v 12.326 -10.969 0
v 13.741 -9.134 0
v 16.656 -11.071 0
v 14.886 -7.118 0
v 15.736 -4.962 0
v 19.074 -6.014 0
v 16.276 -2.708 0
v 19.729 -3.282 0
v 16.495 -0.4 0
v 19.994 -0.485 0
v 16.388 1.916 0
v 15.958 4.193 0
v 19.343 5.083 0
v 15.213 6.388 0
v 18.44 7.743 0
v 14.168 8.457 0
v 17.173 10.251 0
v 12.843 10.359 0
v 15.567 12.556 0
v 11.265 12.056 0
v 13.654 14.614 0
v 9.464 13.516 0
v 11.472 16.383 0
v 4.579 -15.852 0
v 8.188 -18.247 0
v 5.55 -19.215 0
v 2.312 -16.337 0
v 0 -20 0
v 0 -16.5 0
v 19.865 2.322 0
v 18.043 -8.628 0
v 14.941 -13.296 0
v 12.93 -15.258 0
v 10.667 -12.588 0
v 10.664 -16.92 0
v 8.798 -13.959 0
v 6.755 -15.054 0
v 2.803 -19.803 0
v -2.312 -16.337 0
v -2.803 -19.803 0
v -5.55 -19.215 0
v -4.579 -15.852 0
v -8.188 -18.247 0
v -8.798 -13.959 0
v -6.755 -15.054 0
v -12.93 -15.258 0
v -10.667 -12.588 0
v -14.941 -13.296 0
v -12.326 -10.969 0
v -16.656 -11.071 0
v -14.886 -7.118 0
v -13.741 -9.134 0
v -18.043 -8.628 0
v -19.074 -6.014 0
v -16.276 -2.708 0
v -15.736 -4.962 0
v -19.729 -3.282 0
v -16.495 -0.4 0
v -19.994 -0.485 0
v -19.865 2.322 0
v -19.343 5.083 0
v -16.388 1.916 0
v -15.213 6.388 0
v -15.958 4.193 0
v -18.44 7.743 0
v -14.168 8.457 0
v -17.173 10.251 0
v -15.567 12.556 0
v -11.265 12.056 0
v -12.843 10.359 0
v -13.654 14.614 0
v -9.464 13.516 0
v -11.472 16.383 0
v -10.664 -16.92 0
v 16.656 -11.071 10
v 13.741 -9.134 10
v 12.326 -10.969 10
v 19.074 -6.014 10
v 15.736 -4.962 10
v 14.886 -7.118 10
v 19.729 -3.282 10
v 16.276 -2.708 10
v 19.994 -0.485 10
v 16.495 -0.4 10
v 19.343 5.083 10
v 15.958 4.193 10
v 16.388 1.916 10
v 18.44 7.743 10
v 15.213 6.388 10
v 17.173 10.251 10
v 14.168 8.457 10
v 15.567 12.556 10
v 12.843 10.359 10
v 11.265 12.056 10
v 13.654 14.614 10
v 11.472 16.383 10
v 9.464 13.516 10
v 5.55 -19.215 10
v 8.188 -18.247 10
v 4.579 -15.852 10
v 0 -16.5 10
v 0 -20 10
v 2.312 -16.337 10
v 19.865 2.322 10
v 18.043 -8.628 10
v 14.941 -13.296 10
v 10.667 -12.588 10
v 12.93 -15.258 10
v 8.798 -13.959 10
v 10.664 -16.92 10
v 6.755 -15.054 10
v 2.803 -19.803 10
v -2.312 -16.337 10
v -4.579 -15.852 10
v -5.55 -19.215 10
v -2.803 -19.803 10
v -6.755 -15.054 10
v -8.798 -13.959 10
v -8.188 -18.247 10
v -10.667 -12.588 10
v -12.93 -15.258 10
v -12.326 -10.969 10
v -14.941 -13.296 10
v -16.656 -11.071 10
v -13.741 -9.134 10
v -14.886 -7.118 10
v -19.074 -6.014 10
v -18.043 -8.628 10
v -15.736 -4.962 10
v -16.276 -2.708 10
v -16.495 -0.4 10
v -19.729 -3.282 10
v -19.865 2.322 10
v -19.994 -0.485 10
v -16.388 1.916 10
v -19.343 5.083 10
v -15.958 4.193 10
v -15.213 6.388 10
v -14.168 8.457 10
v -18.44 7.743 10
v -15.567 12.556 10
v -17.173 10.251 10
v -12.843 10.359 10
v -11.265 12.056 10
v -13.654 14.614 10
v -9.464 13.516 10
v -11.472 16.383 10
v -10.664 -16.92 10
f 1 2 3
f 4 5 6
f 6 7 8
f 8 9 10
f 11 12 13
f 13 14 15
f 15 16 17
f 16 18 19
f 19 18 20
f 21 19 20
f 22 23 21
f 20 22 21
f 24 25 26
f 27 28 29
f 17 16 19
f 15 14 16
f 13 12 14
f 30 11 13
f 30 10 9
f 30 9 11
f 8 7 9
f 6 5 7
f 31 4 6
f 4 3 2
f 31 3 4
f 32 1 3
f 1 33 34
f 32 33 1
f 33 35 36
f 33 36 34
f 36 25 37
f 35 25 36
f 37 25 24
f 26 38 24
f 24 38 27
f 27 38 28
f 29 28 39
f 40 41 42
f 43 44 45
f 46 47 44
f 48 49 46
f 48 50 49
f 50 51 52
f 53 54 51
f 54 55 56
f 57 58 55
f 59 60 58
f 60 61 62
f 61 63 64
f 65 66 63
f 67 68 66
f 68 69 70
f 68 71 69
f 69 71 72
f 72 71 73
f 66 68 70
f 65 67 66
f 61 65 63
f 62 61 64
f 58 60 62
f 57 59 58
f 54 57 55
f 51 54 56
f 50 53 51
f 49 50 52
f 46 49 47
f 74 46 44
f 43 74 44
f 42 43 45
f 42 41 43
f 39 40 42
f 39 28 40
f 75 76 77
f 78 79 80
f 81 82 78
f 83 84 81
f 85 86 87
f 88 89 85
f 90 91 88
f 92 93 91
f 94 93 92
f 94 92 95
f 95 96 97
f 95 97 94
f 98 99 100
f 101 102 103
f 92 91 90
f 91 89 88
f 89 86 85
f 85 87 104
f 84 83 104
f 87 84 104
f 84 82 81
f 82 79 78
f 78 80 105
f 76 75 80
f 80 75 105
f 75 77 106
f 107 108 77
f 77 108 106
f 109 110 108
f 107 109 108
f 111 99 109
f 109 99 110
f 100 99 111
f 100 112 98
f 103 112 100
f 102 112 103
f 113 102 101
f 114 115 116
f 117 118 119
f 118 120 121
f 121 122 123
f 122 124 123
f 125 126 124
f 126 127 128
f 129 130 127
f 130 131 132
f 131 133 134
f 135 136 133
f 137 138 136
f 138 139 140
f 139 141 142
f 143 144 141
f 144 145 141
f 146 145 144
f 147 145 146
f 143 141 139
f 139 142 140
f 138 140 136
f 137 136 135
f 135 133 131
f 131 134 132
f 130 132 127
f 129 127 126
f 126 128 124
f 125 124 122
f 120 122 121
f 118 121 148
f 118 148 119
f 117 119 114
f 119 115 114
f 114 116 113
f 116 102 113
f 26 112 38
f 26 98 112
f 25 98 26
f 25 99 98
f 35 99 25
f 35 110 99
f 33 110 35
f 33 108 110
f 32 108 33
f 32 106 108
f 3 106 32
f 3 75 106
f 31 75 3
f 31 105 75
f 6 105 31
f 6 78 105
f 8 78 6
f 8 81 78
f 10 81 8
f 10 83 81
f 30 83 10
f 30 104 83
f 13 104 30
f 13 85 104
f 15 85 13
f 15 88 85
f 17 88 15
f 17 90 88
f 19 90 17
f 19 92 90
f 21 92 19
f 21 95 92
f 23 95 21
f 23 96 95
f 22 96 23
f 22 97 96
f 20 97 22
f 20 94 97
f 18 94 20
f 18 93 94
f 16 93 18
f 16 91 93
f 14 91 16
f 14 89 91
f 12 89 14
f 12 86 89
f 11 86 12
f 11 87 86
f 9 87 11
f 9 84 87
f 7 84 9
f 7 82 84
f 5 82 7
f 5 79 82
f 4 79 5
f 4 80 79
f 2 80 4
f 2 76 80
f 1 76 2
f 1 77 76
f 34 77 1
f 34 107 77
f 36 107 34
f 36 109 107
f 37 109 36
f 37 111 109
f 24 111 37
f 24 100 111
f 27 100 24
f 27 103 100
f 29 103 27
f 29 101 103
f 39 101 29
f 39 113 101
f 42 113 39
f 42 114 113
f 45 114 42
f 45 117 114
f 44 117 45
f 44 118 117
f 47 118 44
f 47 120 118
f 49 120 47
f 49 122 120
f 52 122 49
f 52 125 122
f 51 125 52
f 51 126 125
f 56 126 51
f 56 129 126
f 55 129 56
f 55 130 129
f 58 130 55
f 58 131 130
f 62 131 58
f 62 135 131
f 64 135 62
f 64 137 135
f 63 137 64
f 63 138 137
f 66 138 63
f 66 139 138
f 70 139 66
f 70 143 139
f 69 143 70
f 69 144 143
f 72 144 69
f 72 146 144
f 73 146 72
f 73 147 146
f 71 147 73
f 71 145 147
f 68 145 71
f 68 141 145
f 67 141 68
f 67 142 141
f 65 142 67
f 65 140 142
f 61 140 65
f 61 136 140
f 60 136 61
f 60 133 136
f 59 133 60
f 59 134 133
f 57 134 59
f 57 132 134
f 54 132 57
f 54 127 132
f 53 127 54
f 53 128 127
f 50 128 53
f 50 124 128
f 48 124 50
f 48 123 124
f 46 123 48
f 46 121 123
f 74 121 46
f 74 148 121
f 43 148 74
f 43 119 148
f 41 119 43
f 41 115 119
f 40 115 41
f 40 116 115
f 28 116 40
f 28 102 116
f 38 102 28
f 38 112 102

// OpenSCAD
$fn = 32;

// ----------------------------------------------------------------------
// Spring clip: 40 mm outside, 3.5 mm band, 70 degree opening
// ----------------------------------------------------------------------

// --- parameters (mm) ---
outer_r = 20;             // clip outside radius
inner_r = 16.5;           // clip bore radius
band = 3.5;               // band thickness
clip_w = 10;              // clip width
opening = 70;             // opening angle

clip_profile = [[-11.472, 16.383], [-13.654, 14.614], [-15.567, 12.556], [-17.173, 10.251], [-18.44, 7.743], [-19.343, 5.083], [-19.865, 2.322], [-19.994, -0.485], [-19.729, -3.282], [-19.074, -6.014], [-18.043, -8.628], [-16.656, -11.071], [-14.941, -13.296], [-12.93, -15.258], [-10.664, -16.92], [-8.188, -18.247], [-5.55, -19.215], [-2.803, -19.803], [0, -20], [2.803, -19.803], [5.55, -19.215], [8.188, -18.247], [10.664, -16.92], [12.93, -15.258], [14.941, -13.296], [16.656, -11.071], [18.043, -8.628], [19.074, -6.014], [19.729, -3.282], [19.994, -0.485], [19.865, 2.322], [19.343, 5.083], [18.44, 7.743], [17.173, 10.251], [15.567, 12.556], [13.654, 14.614], [11.472, 16.383], [9.464, 13.516], [11.265, 12.056], [12.843, 10.359], [14.168, 8.457], [15.213, 6.388], [15.958, 4.193], [16.388, 1.916], [16.495, -0.4], [16.276, -2.708], [15.736, -4.962], [14.886, -7.118], [13.741, -9.134], [12.326, -10.969], [10.667, -12.588], [8.798, -13.959], [6.755, -15.054], [4.579, -15.852], [2.312, -16.337], [0, -16.5], [-2.312, -16.337], [-4.579, -15.852], [-6.755, -15.054], [-8.798, -13.959], [-10.667, -12.588], [-12.326, -10.969], [-13.741, -9.134], [-14.886, -7.118], [-15.736, -4.962], [-16.276, -2.708], [-16.495, -0.4], [-16.388, 1.916], [-15.958, 4.193], [-15.213, 6.388], [-14.168, 8.457], [-12.843, 10.359], [-11.265, 12.056], [-9.464, 13.516]];

difference() {
  union() {
    linear_extrude(height = clip_w) polygon(clip_profile);
  }
}
